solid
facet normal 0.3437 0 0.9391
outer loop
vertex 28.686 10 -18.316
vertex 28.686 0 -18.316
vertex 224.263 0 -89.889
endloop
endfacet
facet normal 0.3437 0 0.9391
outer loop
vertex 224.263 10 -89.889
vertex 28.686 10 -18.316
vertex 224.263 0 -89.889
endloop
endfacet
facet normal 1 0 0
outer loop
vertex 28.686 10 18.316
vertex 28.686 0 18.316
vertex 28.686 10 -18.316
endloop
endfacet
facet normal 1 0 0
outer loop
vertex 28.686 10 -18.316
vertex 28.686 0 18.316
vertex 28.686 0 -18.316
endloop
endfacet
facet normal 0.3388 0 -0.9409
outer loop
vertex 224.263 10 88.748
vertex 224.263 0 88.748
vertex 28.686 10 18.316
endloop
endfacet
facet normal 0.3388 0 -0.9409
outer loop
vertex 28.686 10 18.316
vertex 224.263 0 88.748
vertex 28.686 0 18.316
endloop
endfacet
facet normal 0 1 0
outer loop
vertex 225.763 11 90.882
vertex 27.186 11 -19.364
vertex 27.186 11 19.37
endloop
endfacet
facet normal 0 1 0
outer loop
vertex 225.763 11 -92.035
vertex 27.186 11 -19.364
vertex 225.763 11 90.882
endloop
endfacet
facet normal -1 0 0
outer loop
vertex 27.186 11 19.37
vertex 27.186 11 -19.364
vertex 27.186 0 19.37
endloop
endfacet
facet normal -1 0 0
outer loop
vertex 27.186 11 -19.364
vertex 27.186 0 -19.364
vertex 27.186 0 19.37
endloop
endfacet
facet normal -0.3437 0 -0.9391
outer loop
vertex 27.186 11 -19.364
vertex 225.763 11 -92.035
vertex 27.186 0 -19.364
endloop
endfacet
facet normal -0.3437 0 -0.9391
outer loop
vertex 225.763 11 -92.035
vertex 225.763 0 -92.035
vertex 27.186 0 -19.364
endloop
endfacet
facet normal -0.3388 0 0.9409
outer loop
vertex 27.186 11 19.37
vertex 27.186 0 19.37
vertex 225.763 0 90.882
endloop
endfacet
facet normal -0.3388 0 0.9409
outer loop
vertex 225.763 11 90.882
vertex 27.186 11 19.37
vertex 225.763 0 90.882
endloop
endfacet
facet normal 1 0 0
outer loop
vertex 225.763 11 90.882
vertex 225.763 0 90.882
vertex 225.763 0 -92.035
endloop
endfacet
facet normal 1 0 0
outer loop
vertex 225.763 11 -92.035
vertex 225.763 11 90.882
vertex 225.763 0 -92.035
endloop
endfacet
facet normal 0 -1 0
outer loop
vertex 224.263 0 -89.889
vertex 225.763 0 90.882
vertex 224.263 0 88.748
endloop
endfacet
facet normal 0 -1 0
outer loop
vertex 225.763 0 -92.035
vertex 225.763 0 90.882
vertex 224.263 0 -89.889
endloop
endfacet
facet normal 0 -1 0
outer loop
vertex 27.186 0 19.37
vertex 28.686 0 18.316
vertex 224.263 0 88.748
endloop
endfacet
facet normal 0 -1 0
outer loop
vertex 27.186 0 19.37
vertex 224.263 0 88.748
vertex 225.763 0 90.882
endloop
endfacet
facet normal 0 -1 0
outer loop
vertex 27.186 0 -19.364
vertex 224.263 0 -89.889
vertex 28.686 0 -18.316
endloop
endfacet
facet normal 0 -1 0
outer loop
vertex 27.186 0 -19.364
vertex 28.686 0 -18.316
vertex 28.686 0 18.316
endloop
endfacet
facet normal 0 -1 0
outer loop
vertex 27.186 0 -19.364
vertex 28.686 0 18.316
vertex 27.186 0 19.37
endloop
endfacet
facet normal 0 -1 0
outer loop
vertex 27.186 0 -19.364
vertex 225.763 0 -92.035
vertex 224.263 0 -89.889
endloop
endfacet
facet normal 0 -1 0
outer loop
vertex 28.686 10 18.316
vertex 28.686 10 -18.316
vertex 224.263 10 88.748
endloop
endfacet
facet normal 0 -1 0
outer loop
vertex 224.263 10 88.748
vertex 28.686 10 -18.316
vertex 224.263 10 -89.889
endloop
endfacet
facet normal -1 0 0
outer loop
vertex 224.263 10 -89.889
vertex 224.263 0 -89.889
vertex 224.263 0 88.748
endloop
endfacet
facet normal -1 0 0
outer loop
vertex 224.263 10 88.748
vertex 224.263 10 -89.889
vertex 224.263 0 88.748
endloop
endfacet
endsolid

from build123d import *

# Parameters (mm, degrees)
EXTRU_MINCE1_DEPTH = 10
BOSS_EXTRU_1_DEPTH = 1


with BuildPart() as part:
    # Esquisse1 → Extru.-Mince1 (new body)
    with BuildSketch(Plane(origin=(0, 0, 0), x_dir=(1, 0, 0), z_dir=(0, 1, 0))):
        Polygon((225.762963936, -90.882191775), (27.185876504, -19.369864417), (27.185876504, 19.364097393), (225.762963936, 92.035383262), align=None)
        Polygon((224.262963936, -88.747703615), (28.685876504, -18.315747537), (28.685876504, 18.315747537), (224.262963936, 89.889153179), align=None, mode=Mode.SUBTRACT)
    extrude(amount=EXTRU_MINCE1_DEPTH)

    # Esquisse2 → Boss.-Extru.1 (add)
    with BuildSketch(Plane(origin=(0, 10, 0), x_dir=(1, 0, 0), z_dir=(0, 1, 0))):
        Polygon((225.762963936, -90.882191775), (225.762963936, 92.035383262), (27.185876504, 19.364097393), (27.185876504, -19.369864417), align=None)
    extrude(amount=BOSS_EXTRU_1_DEPTH)


solid = part.part
